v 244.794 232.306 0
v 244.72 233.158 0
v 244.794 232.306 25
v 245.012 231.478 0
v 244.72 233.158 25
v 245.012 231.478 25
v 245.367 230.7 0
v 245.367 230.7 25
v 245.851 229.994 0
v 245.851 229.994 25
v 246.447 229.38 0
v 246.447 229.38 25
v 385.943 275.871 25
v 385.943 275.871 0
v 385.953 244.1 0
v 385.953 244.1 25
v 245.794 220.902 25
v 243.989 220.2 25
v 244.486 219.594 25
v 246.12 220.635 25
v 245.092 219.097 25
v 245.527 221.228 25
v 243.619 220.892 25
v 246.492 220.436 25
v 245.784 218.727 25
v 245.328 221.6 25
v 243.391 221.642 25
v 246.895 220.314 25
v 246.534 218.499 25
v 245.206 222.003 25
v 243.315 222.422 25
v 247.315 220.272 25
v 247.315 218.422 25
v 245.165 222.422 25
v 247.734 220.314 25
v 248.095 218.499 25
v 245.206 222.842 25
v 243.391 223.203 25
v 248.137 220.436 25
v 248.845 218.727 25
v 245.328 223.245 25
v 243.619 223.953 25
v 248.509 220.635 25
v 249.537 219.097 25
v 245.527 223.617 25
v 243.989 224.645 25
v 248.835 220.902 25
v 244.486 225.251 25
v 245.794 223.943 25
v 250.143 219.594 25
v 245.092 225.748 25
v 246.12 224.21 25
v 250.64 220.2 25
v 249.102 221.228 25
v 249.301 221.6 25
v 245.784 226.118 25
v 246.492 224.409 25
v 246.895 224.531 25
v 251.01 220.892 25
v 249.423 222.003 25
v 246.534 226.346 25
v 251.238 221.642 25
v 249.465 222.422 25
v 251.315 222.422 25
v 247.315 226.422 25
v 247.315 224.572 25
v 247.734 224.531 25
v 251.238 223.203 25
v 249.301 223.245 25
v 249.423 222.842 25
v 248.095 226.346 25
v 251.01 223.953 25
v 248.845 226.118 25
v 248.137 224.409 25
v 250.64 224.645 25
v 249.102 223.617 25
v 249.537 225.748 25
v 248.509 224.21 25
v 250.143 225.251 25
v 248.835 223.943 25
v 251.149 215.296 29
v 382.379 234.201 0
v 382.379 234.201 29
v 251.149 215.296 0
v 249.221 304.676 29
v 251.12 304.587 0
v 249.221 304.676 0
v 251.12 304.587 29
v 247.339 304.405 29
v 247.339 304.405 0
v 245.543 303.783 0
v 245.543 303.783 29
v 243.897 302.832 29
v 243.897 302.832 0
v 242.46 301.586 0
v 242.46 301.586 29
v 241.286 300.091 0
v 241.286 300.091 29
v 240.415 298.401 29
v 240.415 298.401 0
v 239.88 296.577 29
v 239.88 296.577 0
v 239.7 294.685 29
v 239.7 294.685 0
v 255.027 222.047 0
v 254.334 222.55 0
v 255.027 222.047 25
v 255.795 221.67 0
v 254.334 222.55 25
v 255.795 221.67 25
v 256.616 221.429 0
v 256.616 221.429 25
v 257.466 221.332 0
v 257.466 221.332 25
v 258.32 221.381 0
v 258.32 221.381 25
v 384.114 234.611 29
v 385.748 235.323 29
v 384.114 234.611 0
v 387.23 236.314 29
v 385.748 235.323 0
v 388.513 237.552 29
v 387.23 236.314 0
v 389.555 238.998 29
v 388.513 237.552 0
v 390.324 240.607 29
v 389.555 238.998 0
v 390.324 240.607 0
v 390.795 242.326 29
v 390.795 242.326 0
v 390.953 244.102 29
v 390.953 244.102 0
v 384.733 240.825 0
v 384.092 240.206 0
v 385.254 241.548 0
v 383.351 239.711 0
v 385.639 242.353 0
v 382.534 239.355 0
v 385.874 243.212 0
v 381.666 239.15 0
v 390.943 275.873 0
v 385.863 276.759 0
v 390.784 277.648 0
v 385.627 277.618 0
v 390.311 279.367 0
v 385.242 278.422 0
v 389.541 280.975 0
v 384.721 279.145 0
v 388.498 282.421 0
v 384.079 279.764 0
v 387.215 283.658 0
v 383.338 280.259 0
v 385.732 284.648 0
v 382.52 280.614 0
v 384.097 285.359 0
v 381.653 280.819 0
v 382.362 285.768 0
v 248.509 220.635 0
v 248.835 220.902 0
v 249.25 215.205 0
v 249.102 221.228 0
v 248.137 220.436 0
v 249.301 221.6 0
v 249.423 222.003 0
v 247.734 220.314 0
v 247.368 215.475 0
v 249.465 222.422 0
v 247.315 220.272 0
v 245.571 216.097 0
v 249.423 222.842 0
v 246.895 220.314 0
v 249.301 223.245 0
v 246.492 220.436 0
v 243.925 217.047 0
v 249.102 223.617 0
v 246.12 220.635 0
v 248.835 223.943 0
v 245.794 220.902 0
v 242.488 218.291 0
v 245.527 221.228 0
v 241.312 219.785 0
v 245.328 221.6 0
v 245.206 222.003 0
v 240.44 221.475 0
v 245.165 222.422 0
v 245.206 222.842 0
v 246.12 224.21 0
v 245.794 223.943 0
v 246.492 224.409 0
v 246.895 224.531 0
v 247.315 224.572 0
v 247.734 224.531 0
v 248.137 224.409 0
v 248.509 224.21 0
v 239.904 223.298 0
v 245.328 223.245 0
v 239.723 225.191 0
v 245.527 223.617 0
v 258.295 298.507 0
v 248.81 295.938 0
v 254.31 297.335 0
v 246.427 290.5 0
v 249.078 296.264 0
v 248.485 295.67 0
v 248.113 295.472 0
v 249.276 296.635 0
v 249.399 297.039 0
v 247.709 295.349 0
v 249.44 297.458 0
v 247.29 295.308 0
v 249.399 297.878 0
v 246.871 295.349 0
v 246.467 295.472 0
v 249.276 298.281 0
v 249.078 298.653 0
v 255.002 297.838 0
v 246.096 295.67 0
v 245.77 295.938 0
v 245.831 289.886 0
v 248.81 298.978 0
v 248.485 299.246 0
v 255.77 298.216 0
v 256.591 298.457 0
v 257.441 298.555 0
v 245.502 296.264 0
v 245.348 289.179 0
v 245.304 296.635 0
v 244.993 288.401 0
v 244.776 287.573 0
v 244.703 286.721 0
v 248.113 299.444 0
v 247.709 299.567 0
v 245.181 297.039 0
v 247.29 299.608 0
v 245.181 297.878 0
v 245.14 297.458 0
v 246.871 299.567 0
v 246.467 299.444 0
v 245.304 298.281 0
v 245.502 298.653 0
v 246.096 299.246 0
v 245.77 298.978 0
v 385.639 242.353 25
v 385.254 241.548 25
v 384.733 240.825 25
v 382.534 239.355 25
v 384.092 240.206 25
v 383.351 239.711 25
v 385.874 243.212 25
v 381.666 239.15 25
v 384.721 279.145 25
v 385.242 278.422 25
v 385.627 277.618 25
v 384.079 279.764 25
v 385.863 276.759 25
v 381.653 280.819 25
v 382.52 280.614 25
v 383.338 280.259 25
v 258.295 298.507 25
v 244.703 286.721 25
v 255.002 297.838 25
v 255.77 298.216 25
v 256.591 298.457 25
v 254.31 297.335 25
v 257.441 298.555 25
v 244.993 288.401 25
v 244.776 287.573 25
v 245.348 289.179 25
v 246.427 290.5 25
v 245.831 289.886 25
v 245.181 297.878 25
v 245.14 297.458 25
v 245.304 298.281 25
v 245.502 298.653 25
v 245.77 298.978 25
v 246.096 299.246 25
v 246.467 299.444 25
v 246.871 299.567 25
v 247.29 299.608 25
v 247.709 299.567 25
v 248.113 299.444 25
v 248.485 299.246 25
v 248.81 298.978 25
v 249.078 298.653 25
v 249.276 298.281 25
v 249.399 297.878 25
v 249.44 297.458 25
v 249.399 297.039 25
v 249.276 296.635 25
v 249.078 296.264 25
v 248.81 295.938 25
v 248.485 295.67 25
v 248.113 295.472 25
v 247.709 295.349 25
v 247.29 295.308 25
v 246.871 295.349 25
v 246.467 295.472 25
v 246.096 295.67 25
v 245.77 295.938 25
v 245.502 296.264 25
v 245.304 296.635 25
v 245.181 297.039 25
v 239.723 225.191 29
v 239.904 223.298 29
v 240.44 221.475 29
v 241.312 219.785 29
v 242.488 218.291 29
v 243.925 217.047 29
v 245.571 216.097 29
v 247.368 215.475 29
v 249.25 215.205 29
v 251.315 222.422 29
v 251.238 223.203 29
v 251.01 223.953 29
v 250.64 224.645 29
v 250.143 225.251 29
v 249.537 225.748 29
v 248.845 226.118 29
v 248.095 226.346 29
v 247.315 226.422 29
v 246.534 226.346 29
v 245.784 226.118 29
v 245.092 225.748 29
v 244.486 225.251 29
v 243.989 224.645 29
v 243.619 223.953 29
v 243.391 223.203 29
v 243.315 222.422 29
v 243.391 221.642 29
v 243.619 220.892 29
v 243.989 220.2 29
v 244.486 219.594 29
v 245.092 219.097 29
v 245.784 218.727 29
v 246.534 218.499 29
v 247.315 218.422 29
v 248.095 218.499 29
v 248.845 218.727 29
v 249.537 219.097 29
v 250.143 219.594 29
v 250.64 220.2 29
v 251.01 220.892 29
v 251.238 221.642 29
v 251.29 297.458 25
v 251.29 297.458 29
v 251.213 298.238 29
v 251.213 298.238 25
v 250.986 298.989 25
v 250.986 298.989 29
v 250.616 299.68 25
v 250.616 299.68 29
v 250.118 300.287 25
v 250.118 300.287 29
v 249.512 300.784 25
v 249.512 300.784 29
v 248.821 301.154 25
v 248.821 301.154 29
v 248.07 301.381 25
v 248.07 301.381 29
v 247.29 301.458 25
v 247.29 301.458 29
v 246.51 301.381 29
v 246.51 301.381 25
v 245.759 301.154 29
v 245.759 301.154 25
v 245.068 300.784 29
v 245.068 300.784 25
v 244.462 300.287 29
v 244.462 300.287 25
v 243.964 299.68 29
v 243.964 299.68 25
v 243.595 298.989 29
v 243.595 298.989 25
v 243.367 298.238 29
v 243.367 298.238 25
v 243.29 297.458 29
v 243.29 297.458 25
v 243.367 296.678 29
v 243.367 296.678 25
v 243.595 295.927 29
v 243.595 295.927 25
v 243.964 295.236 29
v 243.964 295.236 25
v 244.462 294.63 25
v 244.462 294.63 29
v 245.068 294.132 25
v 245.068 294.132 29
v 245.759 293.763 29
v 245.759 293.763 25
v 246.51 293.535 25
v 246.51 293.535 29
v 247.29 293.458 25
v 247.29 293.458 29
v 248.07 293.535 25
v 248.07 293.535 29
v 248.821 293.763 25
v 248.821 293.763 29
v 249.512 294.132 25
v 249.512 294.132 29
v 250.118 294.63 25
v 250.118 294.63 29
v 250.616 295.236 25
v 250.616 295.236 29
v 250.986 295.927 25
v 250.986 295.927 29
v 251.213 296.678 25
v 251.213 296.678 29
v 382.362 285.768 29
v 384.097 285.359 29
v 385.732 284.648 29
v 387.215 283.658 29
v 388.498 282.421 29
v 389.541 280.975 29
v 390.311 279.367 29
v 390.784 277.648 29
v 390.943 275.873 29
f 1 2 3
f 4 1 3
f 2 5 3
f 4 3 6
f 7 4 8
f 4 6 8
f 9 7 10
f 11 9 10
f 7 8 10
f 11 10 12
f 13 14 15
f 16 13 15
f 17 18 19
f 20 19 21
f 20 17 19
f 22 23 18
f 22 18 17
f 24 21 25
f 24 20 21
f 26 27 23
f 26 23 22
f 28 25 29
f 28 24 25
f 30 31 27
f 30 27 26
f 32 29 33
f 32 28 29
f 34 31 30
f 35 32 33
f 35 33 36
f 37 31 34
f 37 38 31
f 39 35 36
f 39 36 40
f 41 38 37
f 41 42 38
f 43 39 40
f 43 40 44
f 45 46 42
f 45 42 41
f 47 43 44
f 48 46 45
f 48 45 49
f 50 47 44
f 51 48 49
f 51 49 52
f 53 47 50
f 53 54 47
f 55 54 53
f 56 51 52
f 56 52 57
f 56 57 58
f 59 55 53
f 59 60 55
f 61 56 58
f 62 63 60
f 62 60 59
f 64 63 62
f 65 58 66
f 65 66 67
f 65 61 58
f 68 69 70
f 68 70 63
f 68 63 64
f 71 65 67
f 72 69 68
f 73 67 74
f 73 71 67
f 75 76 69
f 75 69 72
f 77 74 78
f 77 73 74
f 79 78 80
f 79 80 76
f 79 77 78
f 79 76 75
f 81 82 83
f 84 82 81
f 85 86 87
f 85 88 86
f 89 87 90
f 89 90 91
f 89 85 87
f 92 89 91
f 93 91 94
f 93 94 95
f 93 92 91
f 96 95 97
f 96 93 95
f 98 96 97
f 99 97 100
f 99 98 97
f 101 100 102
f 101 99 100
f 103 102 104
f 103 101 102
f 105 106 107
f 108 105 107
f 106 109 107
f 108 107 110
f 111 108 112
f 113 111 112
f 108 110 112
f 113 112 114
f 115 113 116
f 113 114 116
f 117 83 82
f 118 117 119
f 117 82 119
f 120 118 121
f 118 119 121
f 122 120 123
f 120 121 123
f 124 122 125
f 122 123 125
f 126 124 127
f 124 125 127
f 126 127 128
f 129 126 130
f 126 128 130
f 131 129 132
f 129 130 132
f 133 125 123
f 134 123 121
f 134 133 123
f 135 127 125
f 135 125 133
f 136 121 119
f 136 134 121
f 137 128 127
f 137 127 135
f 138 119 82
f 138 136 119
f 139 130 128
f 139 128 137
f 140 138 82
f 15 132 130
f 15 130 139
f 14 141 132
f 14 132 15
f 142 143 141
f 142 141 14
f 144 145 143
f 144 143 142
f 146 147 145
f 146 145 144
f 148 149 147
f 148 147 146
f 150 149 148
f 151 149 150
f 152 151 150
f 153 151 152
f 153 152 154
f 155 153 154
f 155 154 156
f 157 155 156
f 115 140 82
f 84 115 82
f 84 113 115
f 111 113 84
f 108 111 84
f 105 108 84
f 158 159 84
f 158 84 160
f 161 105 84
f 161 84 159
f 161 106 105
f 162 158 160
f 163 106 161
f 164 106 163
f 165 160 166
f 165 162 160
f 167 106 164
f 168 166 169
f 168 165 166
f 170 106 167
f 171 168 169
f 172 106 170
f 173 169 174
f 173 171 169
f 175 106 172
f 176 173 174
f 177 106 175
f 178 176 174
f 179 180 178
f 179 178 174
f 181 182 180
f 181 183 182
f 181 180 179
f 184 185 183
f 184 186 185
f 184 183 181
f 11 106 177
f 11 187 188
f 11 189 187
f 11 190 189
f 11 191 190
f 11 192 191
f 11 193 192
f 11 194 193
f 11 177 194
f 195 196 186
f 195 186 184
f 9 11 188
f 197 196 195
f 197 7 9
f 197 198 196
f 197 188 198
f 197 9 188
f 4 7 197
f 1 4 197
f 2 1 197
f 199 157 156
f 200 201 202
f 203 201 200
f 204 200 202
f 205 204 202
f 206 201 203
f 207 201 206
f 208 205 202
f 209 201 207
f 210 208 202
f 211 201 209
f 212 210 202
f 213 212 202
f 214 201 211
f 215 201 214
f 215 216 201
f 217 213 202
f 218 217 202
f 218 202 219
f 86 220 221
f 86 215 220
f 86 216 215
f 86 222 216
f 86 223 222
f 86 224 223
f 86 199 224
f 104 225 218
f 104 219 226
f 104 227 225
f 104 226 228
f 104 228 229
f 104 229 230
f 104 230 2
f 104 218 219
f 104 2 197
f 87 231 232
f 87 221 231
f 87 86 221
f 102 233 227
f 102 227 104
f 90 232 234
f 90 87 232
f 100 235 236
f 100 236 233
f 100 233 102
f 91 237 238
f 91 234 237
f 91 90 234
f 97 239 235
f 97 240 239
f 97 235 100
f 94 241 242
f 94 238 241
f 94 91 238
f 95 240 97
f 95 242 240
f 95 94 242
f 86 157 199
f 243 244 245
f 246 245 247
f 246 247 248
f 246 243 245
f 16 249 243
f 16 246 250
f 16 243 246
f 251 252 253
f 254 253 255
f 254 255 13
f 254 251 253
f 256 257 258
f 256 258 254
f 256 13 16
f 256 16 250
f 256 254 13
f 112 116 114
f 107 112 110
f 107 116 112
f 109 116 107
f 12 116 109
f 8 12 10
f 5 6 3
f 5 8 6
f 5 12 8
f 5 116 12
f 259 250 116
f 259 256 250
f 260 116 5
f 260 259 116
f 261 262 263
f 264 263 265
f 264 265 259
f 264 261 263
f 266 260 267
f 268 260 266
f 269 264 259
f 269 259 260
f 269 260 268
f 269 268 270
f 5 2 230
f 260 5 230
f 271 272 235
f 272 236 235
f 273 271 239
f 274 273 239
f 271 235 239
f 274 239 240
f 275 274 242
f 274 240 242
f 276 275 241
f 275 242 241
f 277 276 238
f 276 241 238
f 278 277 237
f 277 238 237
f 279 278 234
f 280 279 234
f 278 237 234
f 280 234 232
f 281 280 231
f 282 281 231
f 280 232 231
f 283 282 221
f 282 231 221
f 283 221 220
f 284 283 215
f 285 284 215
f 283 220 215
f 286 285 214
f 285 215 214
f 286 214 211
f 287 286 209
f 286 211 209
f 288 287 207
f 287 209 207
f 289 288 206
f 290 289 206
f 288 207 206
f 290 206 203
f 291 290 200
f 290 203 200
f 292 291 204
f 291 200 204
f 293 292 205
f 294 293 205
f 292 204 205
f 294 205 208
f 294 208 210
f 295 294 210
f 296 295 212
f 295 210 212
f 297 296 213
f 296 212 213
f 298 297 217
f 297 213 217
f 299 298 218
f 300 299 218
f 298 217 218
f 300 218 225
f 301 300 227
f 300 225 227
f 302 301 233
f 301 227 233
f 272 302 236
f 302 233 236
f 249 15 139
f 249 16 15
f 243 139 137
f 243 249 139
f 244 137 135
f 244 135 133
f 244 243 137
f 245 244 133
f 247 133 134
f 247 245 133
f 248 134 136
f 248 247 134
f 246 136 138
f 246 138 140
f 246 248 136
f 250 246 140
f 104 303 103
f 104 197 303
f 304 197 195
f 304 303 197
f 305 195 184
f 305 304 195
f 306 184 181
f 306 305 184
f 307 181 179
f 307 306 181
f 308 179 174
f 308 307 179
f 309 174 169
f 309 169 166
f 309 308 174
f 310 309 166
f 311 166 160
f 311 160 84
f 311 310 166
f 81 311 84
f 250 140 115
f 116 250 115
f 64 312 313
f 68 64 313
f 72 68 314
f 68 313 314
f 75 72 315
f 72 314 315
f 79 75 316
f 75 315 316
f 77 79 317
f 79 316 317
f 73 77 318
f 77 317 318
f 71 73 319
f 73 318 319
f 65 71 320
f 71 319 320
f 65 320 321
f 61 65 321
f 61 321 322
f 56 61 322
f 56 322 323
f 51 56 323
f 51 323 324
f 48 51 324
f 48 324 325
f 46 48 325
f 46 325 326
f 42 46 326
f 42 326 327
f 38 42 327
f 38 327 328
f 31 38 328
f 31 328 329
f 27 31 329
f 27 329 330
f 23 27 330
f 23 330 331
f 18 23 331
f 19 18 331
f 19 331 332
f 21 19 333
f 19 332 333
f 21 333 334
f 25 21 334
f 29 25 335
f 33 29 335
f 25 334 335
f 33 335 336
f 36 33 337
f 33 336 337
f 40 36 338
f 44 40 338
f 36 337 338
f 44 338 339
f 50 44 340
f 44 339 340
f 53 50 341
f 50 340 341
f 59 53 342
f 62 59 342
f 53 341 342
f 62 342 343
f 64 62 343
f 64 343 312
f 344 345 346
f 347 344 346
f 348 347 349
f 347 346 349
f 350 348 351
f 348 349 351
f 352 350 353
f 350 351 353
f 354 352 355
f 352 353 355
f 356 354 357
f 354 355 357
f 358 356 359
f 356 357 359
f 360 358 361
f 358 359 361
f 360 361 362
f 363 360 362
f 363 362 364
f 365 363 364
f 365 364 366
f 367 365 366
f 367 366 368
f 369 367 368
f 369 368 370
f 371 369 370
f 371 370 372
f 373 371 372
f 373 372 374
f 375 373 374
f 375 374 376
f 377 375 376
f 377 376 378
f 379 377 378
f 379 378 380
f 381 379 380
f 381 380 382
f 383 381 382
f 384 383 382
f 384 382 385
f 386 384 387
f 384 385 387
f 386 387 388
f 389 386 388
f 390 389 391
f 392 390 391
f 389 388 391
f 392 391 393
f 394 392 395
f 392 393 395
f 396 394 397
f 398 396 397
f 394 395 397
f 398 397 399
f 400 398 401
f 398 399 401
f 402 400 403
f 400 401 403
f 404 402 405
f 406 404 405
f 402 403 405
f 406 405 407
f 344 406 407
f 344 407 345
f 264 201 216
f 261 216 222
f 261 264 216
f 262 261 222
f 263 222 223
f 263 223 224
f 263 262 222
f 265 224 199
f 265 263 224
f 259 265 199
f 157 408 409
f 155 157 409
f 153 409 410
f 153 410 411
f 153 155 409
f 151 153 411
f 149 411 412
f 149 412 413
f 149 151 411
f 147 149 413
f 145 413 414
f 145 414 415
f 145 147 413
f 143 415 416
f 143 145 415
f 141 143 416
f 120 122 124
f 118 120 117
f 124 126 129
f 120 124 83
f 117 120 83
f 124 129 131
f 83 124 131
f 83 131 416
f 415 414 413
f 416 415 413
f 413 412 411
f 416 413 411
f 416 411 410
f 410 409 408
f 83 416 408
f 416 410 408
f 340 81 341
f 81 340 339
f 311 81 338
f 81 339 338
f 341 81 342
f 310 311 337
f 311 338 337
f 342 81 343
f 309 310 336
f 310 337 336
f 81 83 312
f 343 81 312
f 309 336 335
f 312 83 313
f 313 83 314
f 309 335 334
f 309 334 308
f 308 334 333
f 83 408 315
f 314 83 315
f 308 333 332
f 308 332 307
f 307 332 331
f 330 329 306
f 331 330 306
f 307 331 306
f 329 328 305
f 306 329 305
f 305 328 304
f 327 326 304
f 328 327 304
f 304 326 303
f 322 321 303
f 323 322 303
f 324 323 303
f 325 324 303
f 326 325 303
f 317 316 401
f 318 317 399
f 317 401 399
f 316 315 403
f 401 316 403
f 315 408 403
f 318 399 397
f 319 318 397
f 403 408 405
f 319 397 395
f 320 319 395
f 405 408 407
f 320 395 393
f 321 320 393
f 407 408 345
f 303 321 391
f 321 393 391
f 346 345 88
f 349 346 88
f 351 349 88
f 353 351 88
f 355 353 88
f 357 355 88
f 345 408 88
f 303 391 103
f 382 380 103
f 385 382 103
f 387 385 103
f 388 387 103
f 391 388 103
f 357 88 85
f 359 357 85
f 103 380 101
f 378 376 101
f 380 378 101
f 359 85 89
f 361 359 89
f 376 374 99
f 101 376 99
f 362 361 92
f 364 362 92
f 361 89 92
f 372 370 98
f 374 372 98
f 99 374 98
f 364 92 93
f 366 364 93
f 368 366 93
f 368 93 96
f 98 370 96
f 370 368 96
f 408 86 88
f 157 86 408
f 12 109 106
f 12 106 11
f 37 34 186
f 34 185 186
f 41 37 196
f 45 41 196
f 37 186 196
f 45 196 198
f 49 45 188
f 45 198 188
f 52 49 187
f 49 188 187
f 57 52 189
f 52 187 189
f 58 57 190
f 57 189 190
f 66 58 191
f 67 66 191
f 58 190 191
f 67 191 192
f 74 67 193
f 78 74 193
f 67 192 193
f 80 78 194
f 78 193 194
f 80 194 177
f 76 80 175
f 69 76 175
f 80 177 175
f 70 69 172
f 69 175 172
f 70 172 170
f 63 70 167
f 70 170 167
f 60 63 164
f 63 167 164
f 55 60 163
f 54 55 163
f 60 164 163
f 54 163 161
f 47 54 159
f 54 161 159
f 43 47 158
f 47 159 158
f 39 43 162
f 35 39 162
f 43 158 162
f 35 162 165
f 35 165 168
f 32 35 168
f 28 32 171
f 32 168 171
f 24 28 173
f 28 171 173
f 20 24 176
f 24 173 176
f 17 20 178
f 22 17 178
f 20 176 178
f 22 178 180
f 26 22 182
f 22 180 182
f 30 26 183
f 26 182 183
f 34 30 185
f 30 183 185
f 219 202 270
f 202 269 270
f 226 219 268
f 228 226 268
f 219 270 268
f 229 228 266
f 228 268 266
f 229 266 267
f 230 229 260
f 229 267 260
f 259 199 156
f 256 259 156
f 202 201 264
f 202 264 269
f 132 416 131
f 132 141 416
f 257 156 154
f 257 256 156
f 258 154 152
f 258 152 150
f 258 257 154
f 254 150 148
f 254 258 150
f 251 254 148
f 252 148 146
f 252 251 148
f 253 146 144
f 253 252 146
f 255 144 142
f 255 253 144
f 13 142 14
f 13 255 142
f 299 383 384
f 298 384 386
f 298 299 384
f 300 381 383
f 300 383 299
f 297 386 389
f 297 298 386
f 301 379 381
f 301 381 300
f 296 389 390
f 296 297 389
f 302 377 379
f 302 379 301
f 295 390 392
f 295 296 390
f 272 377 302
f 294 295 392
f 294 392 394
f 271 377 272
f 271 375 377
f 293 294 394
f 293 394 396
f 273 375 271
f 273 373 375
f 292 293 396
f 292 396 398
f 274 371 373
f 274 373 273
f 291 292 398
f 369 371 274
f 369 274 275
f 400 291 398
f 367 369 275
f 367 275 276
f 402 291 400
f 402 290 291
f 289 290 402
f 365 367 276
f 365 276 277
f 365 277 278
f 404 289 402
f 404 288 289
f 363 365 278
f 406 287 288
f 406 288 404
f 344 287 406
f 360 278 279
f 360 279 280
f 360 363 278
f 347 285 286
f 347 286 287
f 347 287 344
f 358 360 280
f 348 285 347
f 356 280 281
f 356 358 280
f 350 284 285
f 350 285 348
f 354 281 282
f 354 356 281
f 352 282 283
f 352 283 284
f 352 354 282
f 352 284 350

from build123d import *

# Parameters (mm, degrees)
EXTRUDE_THIN1_DEPTH            = 25
BOSS_EXTRUDE1_DEPTH            = 25
BOSS_EXTRUDE2_DEPTH            = 4
FILLET1_R                      = 10
CBORE_FOR_M4_SHCS1_D           = 4.3
CBORE_FOR_M4_SHCS1_CBORE_D     = 8
CBORE_FOR_M4_SHCS1_CBORE_DEPTH = 4
FILLET2_R                      = 5


with BuildPart() as part:
    # Sketch2 → Extrude-Thin1 (new body)
    with BuildSketch(Plane.XY):
        Polygon((239.726649941, 213.650926496), (239.696415712, 306.224679496), (390.940168333, 284.538204309), (390.956204861, 235.436188292), align=None)
        Polygon((244.724765221, 219.422538988), (244.698299899, 300.456332965), (385.941583666, 280.203800773), (385.954790061, 239.767325867), align=None, mode=Mode.SUBTRACT)
    extrude(amount=EXTRUDE_THIN1_DEPTH)

    # Sketch3 → Boss-Extrude1 (add)
    with BuildSketch(Plane.XY):
        Polygon((244.698299899, 300.456332965), (256.034798835, 298.830819854), (244.702040223, 289.003888378), align=None)
        Polygon((244.721024897, 230.874983576), (244.724765221, 219.422538988), (256.060199967, 221.055456665), align=None)
    extrude(amount=BOSS_EXTRUDE1_DEPTH)

    # Sketch4 → Boss-Extrude2 (add)
    with BuildSketch(Plane.XY.offset(25)):
        Polygon((239.696415712, 306.224679496), (390.940168333, 284.538204309), (390.956204861, 235.436188292), (239.726649941, 213.650926496), align=None)
    extrude(amount=BOSS_EXTRUDE2_DEPTH)

    # Fillet1
    fillet1_edges = [part.edges().sort_by_distance(p)[0] for p in [
        (239.726649941, 213.650926496, 14.5),
        (390.956204861, 235.436188292, 14.5),
        (390.940168333, 284.538204309, 14.5),
        (239.696415712, 306.224679496, 14.5),
    ]]
    fillet(fillet1_edges, radius=FILLET1_R)

    # CBORE for M4 SHCS1 (through all)
    with Locations(Plane(origin=(247.290055606, 297.458116912, 29), x_dir=(1, 0, 0), z_dir=(0, 0, 1))):
        with Locations((0, 0), (0.024506359, -75.035669596)):
            CounterBoreHole(CBORE_FOR_M4_SHCS1_D / 2, CBORE_FOR_M4_SHCS1_CBORE_D / 2, CBORE_FOR_M4_SHCS1_CBORE_DEPTH)

    # Fillet2
    fillet2_edges = [part.edges().sort_by_distance(p)[0] for p in [
        (385.954790061, 239.767325867, 12.5),
        (385.941583666, 280.203800773, 12.5),
        (256.034798835, 298.830819854, 12.5),
        (244.702040223, 289.003888378, 12.5),
        (244.721024897, 230.874983576, 12.5),
        (256.060199967, 221.055456665, 12.5),
    ]]
    fillet(fillet2_edges, radius=FILLET2_R)


solid = part.part
